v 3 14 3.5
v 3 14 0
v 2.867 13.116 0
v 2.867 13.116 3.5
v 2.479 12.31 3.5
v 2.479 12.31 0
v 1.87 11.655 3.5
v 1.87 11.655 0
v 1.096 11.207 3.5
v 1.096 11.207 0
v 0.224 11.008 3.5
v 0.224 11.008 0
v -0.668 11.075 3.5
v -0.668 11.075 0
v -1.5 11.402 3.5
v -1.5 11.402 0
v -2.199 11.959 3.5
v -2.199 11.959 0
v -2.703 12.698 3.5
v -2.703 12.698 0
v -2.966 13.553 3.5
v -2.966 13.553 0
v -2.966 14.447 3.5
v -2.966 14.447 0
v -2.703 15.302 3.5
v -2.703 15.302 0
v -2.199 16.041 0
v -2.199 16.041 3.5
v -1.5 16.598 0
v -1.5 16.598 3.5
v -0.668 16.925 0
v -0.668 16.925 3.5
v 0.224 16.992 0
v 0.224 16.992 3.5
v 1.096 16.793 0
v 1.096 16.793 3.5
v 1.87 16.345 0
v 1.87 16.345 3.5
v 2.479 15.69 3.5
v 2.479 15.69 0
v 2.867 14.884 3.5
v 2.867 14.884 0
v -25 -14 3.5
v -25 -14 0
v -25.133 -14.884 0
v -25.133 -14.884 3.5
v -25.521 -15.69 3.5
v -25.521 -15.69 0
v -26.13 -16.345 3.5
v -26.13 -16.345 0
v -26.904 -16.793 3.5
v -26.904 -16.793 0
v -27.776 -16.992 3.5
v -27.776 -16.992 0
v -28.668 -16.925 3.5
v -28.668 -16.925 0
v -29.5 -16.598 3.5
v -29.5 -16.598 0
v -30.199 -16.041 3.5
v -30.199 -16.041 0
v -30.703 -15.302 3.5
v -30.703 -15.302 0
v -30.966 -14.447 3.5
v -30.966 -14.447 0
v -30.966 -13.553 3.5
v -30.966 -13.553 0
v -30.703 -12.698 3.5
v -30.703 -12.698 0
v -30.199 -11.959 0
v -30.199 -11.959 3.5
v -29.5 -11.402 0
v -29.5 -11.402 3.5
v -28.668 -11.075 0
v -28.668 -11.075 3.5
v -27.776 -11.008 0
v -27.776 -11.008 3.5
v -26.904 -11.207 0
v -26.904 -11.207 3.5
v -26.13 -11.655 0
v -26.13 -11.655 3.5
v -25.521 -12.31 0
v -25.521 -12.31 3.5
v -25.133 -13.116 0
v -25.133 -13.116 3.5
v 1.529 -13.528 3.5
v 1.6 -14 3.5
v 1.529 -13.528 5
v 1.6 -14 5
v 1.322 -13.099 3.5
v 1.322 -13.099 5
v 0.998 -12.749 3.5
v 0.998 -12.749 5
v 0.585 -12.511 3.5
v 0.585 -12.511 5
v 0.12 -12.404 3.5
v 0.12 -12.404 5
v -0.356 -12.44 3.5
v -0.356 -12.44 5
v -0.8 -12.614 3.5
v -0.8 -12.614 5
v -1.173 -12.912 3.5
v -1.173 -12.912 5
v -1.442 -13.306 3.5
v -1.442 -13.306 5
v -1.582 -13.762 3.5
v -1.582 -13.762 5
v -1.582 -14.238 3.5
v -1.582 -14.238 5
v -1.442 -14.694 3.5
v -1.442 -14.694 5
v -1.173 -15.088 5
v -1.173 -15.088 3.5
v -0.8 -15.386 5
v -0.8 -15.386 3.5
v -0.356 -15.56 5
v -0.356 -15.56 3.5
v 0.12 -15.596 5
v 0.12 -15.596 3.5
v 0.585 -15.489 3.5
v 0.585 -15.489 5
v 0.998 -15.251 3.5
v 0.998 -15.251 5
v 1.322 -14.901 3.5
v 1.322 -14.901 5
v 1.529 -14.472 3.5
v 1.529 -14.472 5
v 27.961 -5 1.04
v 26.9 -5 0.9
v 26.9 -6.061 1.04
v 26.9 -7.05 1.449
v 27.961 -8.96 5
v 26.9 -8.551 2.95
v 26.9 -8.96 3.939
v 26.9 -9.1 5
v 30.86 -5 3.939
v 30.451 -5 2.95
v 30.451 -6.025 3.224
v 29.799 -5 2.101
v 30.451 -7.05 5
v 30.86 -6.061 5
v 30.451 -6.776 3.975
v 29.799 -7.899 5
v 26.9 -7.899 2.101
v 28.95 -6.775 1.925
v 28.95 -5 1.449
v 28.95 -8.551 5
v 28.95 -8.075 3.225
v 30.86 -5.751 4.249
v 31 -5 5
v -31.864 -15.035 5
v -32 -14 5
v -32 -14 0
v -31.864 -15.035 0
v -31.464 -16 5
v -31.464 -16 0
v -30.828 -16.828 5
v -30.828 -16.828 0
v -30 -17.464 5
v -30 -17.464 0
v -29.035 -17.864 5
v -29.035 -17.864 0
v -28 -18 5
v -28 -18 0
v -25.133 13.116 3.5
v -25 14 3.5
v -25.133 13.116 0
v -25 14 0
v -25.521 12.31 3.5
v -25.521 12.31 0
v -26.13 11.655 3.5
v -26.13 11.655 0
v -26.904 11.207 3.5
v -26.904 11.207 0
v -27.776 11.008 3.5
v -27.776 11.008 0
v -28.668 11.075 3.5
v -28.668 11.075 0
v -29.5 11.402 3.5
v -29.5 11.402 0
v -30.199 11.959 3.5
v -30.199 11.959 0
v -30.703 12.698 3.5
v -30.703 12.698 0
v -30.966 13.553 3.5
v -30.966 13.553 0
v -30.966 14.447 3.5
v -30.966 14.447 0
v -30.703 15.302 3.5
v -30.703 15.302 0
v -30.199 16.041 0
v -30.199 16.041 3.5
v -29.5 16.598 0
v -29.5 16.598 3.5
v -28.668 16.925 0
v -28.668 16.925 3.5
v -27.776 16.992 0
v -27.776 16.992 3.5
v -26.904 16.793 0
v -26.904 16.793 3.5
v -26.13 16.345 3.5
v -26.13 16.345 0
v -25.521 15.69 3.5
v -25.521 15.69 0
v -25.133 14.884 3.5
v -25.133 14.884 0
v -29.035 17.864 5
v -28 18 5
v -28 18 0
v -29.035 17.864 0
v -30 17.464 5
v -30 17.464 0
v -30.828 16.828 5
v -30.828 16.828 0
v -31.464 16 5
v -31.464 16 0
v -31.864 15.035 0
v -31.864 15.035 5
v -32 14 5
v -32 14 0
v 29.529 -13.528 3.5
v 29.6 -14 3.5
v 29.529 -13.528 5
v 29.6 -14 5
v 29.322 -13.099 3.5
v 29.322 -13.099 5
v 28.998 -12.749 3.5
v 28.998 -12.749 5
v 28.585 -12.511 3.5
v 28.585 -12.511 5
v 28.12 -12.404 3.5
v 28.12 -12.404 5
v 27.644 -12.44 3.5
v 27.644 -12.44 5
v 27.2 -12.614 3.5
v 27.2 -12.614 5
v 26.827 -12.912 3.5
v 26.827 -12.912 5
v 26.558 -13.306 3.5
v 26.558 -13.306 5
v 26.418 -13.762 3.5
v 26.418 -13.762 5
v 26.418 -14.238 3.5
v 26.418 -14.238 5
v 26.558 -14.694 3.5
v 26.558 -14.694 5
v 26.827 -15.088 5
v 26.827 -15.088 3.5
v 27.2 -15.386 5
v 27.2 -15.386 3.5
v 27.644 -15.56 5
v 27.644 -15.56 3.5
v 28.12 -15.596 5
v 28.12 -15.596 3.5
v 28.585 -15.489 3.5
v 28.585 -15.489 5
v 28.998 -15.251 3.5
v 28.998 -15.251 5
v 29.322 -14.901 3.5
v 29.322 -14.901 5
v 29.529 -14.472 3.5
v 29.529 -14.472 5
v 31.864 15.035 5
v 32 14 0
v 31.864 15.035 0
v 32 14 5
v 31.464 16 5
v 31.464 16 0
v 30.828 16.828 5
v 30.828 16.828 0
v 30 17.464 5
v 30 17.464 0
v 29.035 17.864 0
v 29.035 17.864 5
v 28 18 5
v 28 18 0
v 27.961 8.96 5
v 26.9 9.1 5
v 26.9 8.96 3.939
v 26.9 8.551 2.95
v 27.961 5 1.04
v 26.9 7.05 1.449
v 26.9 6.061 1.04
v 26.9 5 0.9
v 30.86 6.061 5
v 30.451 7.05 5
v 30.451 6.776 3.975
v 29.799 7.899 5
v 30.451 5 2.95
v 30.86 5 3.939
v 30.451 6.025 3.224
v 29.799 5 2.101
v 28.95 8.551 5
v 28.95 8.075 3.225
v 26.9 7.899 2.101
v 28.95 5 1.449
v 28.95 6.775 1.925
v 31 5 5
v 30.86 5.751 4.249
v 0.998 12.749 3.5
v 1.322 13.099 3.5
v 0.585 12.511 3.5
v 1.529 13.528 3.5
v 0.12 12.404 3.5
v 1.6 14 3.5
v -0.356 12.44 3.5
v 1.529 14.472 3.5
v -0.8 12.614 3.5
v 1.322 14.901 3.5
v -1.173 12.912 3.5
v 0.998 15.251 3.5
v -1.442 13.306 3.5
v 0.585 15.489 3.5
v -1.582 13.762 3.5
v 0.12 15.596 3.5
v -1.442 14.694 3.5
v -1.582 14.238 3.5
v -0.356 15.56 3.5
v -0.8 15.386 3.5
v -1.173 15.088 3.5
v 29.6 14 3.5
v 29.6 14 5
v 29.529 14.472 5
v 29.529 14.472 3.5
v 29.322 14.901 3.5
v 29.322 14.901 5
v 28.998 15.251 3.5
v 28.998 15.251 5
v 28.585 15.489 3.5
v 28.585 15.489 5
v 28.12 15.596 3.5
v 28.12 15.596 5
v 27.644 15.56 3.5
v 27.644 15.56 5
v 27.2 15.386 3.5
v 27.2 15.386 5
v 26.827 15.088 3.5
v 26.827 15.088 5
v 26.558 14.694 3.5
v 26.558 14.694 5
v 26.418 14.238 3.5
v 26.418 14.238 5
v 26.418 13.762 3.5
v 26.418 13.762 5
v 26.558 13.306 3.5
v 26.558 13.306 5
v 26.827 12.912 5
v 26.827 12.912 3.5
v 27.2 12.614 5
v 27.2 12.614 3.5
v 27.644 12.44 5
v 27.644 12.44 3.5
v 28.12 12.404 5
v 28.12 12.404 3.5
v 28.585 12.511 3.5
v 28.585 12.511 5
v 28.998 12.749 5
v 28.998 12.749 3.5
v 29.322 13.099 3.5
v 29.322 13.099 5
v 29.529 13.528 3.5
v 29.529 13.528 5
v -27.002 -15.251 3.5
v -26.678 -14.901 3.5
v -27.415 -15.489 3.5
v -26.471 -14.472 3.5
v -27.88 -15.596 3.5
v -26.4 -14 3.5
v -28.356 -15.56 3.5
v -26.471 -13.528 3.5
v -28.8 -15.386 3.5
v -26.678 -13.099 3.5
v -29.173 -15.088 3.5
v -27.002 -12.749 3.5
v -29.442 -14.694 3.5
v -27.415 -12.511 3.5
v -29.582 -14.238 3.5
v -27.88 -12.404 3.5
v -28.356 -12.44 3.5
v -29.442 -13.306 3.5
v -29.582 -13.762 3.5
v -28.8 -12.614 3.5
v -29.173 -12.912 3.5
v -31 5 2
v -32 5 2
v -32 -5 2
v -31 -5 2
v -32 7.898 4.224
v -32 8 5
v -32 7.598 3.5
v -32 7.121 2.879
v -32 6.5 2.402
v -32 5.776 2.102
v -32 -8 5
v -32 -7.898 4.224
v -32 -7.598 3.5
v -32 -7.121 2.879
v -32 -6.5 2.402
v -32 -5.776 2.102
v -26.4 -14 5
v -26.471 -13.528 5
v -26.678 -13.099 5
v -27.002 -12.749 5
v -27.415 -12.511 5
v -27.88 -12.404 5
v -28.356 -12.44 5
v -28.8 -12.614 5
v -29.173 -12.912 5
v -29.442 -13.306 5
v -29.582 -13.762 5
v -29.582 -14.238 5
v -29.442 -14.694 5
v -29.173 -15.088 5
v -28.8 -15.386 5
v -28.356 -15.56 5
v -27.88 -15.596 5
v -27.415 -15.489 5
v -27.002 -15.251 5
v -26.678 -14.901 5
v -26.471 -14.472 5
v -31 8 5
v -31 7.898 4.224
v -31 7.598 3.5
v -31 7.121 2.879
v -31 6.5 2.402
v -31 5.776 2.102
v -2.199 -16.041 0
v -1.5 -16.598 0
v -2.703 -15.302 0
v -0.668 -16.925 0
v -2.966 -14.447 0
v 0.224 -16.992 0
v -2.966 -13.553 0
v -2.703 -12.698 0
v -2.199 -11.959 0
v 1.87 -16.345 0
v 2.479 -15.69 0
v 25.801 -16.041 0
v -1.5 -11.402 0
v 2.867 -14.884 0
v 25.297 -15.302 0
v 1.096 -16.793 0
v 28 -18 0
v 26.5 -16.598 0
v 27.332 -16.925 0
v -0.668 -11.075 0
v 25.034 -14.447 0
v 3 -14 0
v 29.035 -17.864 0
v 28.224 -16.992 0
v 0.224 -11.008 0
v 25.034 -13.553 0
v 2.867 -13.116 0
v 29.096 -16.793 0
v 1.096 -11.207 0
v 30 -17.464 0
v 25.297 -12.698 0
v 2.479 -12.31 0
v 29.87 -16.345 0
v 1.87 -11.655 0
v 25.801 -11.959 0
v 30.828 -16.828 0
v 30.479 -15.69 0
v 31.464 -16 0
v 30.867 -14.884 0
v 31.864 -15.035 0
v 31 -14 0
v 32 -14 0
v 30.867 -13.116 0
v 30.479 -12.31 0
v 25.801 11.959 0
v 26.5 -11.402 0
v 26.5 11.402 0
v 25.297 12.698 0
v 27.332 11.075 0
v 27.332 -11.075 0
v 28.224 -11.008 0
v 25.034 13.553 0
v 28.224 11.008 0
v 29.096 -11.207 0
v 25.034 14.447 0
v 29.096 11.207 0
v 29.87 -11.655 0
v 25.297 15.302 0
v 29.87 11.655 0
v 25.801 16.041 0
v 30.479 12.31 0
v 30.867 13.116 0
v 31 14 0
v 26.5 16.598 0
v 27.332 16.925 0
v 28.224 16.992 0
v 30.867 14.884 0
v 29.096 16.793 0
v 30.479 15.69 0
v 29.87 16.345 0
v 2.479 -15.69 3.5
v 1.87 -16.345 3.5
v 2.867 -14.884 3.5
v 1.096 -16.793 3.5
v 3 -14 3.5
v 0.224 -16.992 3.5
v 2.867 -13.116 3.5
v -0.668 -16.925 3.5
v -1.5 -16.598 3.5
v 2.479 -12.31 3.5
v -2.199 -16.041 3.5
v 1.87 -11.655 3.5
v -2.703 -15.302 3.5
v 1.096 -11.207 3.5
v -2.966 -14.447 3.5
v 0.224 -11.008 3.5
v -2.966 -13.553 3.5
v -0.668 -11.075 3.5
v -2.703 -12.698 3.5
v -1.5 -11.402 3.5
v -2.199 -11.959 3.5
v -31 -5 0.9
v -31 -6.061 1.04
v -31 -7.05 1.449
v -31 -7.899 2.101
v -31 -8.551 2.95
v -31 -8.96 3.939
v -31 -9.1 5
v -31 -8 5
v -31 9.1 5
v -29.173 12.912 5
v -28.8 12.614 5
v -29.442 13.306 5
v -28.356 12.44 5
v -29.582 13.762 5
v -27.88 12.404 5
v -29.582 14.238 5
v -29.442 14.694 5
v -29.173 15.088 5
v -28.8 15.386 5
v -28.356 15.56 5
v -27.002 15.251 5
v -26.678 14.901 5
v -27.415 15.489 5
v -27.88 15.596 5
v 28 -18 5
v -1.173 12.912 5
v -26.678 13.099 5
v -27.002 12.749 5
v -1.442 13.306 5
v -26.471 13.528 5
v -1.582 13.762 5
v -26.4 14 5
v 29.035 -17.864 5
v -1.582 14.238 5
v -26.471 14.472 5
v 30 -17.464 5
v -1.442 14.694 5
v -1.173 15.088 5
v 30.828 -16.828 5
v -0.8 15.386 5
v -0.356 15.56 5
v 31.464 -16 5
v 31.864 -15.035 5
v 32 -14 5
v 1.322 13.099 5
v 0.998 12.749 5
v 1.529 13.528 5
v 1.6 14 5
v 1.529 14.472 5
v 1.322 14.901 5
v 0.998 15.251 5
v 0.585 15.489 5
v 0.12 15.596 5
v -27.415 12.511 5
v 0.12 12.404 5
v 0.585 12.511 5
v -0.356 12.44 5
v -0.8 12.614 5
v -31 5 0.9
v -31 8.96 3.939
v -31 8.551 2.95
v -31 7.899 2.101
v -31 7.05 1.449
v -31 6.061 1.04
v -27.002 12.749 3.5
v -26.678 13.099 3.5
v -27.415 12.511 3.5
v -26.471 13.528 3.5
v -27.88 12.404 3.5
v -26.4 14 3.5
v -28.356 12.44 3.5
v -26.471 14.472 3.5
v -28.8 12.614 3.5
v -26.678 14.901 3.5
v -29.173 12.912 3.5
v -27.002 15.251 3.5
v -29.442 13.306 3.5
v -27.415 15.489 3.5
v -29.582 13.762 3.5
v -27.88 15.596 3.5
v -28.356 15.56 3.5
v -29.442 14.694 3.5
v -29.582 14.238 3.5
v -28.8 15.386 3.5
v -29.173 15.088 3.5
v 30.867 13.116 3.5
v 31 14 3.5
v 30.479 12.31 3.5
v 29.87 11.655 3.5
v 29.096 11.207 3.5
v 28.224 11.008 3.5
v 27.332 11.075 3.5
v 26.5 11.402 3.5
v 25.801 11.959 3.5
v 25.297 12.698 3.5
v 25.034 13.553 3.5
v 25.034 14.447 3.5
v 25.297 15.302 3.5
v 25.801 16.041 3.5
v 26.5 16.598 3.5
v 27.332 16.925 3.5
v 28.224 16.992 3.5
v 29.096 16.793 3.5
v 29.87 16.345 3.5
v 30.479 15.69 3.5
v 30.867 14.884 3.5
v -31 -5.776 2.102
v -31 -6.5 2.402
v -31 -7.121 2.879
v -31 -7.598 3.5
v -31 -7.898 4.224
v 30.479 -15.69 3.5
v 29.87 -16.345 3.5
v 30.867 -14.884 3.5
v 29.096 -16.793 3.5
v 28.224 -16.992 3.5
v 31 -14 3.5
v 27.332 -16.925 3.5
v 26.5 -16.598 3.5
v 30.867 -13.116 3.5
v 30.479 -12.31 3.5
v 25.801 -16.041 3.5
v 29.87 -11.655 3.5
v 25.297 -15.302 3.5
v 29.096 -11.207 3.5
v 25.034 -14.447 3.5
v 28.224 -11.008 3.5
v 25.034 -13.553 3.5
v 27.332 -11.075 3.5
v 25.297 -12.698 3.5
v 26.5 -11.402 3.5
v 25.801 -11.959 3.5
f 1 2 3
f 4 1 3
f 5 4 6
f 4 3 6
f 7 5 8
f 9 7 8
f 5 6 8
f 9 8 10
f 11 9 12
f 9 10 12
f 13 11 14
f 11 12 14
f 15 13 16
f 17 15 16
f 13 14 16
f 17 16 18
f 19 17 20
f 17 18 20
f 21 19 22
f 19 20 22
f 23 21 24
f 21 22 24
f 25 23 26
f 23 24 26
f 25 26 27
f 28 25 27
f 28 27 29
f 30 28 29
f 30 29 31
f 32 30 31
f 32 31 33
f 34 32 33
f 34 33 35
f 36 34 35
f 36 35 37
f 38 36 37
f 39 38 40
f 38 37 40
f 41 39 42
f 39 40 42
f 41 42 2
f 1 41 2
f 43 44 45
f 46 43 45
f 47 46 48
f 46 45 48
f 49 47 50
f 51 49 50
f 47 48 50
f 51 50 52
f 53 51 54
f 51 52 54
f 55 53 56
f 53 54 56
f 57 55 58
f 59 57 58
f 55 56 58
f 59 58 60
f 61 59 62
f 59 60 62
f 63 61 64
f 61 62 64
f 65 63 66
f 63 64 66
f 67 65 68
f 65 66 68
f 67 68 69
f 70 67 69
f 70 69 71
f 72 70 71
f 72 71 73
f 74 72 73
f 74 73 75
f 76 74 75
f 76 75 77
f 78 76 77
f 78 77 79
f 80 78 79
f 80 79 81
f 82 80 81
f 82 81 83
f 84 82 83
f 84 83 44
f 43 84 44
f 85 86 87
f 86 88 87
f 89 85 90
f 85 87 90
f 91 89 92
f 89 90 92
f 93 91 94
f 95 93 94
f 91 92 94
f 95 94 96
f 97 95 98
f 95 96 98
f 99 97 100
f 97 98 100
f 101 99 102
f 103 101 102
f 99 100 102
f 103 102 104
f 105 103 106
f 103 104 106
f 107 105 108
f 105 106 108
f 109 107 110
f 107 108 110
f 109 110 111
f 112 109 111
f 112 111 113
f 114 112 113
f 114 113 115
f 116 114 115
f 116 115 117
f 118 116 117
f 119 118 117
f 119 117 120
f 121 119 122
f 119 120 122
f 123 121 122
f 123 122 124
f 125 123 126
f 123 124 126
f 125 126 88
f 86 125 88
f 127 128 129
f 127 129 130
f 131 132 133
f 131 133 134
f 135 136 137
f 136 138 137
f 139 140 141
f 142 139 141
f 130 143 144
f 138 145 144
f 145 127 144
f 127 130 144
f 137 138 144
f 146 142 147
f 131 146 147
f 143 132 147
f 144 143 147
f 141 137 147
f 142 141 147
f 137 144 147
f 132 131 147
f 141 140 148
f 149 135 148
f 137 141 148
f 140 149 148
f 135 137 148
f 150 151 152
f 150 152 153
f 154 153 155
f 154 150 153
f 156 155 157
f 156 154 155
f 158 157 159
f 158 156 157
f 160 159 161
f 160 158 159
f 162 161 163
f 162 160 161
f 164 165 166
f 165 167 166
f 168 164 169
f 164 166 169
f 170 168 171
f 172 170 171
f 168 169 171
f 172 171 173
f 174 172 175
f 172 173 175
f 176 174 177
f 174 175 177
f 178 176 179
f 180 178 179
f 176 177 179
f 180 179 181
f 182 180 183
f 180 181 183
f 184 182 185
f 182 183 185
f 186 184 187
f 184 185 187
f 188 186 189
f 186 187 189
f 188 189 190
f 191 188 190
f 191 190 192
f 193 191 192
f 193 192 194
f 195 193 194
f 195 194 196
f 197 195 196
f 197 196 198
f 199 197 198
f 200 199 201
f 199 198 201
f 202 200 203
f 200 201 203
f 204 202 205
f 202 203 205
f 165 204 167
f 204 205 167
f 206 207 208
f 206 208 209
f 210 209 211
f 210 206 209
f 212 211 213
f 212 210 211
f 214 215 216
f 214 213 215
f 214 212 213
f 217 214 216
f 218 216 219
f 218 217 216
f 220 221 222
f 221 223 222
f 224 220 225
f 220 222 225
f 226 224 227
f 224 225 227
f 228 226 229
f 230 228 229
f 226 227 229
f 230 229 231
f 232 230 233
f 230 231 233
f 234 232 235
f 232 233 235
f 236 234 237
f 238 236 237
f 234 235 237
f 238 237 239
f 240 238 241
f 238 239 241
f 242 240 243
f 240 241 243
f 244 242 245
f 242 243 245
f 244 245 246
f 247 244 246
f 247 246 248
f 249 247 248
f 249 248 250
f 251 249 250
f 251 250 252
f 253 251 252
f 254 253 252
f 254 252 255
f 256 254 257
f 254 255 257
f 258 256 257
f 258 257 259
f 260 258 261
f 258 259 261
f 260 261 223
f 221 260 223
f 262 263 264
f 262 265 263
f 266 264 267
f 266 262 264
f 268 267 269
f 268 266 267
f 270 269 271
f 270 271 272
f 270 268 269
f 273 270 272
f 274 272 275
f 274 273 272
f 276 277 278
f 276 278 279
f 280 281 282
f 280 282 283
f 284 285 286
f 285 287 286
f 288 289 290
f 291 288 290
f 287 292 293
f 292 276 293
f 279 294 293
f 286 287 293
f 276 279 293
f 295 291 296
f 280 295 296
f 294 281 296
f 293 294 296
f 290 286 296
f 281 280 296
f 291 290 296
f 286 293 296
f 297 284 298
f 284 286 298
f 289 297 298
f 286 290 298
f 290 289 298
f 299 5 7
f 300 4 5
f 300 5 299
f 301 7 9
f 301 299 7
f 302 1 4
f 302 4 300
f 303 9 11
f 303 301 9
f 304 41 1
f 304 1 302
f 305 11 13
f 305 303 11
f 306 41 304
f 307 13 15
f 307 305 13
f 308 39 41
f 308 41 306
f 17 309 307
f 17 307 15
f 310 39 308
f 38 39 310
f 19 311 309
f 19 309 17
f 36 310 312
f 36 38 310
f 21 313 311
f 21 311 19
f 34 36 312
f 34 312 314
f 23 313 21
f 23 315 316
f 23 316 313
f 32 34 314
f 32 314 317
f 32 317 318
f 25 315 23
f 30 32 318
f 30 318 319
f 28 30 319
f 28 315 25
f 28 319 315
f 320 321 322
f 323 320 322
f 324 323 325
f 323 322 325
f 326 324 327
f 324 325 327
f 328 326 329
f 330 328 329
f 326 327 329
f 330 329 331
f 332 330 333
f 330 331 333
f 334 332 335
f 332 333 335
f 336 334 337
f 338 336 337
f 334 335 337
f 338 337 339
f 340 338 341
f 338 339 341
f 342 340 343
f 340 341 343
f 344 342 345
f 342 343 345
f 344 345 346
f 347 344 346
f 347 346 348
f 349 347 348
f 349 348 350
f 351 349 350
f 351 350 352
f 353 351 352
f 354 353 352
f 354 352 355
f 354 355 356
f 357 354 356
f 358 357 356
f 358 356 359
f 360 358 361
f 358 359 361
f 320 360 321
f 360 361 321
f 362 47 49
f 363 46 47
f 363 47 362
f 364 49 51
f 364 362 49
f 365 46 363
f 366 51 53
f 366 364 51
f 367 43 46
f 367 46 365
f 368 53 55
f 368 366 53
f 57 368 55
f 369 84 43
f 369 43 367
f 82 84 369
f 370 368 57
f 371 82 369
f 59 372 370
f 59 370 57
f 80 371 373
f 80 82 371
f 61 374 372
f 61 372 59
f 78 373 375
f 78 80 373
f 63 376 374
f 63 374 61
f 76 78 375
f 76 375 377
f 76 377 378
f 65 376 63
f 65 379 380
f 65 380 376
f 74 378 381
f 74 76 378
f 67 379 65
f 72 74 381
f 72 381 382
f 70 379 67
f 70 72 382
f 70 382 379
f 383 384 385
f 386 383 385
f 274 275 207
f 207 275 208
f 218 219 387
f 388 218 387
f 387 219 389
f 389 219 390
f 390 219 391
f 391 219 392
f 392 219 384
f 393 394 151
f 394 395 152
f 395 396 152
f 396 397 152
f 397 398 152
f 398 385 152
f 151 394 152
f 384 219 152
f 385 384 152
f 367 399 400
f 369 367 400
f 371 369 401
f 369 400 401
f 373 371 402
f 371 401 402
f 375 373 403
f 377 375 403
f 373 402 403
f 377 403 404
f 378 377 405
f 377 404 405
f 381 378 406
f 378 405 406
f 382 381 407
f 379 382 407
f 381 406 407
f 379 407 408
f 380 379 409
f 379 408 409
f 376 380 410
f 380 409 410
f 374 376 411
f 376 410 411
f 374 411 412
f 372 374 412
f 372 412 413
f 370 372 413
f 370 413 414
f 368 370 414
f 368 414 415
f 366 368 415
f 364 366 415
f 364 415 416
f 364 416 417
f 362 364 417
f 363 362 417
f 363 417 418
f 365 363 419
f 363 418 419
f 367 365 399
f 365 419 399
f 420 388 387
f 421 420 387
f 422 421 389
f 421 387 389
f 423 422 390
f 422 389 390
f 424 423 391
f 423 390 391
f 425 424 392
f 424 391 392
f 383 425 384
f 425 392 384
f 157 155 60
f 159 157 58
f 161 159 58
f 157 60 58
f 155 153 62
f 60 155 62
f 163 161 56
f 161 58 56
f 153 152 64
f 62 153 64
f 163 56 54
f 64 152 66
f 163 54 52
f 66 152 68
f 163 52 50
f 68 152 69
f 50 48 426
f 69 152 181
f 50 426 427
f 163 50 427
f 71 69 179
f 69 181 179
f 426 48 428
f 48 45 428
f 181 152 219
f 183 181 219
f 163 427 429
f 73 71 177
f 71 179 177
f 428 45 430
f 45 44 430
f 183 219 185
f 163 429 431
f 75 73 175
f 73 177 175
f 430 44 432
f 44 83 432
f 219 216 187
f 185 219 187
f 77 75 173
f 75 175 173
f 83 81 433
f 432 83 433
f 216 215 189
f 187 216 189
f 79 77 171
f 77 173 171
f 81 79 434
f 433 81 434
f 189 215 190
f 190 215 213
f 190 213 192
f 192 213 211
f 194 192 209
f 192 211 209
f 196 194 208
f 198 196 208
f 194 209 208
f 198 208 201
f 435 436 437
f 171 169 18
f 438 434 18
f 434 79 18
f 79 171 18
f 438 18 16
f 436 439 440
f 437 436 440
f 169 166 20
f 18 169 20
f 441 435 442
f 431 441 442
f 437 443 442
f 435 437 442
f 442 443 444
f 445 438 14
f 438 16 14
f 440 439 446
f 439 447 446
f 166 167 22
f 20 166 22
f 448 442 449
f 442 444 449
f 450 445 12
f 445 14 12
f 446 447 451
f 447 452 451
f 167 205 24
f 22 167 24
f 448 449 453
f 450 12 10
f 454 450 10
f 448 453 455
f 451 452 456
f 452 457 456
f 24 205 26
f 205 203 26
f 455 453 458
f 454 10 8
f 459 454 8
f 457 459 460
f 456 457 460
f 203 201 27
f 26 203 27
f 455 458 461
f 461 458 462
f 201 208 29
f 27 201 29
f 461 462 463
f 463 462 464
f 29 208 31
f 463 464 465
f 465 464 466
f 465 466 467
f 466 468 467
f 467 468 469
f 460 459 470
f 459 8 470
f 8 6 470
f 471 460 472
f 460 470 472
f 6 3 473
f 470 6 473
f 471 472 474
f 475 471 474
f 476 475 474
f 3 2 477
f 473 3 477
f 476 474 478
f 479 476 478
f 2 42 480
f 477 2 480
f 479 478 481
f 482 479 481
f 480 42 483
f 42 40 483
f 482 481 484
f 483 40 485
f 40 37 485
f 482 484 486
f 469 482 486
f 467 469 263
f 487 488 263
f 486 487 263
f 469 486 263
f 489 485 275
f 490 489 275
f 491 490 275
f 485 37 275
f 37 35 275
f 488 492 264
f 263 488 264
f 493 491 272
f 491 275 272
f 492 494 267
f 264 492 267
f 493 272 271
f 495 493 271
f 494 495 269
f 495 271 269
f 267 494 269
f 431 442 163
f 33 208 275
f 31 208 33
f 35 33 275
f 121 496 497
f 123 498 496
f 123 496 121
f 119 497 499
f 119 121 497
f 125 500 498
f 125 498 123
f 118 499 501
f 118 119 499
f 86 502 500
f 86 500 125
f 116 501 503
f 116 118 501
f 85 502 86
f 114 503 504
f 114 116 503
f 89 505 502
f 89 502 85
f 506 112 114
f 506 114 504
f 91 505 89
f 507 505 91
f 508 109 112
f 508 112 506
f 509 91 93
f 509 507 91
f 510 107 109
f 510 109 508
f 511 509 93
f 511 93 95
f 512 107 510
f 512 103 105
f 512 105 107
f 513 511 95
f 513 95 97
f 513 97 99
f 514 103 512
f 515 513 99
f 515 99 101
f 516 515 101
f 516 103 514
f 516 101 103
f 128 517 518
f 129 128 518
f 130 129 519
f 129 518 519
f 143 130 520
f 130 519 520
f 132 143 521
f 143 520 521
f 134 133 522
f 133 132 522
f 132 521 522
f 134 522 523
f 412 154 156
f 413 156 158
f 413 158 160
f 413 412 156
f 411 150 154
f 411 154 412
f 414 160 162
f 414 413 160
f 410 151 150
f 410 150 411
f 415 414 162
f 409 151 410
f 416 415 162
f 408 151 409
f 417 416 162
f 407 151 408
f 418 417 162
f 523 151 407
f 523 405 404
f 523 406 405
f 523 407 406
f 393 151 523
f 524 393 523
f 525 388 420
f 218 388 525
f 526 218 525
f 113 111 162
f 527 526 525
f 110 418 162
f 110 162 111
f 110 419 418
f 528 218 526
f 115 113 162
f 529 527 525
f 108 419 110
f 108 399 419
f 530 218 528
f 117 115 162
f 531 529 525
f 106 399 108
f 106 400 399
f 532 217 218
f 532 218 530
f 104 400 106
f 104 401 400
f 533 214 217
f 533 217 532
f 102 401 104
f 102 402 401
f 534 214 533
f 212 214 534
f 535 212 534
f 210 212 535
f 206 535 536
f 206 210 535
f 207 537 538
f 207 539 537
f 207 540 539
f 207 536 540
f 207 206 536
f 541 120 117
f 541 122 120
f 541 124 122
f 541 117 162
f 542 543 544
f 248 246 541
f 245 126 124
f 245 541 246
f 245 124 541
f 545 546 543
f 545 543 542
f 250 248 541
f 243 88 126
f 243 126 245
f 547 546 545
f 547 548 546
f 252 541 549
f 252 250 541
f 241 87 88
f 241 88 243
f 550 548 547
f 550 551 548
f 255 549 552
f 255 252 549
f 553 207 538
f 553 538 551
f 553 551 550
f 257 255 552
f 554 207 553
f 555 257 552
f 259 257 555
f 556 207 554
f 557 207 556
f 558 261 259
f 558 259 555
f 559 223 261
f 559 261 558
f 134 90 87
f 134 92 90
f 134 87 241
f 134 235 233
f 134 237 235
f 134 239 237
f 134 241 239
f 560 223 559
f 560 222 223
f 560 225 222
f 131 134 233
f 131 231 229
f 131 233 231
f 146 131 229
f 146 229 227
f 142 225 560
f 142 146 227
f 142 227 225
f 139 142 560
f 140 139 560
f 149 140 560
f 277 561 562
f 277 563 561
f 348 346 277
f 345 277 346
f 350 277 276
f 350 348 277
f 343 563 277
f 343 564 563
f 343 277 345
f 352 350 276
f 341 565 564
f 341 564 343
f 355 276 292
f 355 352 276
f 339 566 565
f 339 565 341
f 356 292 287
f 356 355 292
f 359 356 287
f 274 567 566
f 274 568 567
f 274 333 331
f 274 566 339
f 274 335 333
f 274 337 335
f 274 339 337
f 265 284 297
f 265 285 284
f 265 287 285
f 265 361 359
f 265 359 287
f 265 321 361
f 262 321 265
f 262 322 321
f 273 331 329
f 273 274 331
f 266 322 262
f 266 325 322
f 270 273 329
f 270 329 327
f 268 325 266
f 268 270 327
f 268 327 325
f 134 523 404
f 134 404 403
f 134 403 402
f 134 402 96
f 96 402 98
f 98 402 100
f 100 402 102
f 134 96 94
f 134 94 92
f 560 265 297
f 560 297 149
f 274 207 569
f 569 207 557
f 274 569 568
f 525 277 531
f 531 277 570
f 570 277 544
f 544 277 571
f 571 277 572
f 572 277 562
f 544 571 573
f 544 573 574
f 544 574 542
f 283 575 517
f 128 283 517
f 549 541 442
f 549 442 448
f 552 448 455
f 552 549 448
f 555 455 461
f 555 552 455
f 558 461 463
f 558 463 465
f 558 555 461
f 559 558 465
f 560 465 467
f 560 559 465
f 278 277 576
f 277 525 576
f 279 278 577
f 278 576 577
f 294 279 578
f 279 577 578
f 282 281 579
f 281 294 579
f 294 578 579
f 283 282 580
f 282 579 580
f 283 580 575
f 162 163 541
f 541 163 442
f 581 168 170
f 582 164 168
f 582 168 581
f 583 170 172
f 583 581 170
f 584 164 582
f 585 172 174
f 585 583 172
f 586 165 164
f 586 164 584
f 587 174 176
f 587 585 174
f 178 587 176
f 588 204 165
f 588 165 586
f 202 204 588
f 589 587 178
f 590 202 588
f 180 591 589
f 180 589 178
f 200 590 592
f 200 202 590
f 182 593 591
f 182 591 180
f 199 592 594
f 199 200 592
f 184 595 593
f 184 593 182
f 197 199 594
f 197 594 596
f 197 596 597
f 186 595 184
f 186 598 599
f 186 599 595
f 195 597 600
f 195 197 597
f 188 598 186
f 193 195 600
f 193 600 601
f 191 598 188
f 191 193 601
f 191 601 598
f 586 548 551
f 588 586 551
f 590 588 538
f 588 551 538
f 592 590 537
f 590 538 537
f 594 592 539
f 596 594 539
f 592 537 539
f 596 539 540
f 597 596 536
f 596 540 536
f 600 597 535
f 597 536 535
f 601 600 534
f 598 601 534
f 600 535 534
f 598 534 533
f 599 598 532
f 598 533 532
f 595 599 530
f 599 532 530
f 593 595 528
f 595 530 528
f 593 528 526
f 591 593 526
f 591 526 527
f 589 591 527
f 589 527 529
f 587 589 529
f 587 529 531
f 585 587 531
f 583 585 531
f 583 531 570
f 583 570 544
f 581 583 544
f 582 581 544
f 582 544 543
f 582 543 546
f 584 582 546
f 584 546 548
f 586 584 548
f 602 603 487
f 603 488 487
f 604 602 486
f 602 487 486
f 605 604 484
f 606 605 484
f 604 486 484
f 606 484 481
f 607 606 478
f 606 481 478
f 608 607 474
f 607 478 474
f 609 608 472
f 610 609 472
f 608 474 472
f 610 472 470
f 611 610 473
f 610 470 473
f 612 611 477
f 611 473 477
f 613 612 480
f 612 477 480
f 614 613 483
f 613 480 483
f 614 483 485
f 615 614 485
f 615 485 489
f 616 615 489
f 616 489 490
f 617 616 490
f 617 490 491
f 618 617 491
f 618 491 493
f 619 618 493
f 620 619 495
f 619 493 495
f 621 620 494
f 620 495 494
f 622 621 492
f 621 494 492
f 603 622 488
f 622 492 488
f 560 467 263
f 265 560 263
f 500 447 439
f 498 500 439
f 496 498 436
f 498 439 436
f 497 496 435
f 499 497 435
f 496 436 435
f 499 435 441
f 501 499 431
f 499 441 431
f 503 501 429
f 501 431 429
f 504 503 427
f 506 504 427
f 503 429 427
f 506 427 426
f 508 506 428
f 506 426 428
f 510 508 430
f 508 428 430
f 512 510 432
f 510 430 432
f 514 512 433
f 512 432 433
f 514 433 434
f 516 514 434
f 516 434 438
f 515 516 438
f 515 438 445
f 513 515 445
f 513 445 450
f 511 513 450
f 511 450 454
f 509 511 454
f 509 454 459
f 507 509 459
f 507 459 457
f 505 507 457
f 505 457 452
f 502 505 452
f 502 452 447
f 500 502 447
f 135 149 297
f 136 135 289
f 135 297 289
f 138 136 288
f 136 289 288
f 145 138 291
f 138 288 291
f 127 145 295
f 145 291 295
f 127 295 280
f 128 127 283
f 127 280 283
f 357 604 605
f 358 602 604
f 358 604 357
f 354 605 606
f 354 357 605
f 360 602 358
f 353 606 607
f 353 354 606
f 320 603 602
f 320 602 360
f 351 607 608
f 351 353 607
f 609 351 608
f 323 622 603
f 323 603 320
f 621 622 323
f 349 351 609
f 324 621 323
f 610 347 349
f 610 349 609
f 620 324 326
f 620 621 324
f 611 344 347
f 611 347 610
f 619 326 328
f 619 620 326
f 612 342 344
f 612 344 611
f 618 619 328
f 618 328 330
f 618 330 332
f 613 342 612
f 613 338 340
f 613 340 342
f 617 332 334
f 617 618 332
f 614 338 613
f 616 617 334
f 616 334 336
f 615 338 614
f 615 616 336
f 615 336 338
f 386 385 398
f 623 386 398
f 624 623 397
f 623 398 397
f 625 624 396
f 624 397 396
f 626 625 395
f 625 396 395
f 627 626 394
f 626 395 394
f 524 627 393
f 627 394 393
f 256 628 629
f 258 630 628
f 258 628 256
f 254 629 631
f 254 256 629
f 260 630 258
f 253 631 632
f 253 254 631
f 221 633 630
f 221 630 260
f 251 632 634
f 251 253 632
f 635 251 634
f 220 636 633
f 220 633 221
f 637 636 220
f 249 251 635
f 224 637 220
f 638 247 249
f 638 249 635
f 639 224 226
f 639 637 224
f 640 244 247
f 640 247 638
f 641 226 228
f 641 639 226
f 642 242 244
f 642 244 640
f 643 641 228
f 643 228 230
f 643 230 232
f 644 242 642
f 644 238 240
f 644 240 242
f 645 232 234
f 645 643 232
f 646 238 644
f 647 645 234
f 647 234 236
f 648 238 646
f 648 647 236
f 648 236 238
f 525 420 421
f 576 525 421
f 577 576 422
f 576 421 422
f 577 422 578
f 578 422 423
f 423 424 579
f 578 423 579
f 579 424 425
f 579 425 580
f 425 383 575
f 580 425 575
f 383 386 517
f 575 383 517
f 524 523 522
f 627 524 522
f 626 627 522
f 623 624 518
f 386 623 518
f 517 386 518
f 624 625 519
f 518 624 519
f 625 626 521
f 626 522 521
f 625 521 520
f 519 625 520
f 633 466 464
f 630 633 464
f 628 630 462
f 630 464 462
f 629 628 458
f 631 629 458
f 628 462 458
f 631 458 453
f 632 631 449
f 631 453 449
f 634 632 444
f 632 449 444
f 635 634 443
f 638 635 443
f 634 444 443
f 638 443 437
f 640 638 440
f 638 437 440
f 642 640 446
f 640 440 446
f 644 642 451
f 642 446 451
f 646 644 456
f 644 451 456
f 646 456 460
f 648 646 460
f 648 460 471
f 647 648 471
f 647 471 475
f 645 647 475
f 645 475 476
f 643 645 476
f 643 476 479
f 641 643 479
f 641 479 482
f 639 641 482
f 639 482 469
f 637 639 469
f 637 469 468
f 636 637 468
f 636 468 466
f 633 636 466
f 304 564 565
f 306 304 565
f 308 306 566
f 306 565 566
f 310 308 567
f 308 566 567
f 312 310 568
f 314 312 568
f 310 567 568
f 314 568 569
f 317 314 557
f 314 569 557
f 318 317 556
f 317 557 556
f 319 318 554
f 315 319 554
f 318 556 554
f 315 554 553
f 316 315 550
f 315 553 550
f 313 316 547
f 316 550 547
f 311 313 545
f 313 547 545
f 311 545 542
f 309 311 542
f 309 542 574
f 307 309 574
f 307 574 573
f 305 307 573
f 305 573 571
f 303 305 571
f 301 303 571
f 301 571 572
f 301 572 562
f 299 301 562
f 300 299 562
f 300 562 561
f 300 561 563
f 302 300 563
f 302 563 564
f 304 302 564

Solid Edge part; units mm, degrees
sketch "Sketch1" plane through (0, 0, 0) normal (0, 0, 1) x (1, 0, 0)
  line L0 (32, -18) -> (32, 18)
  line L1 (32, 18) -> (-32, 18)
  line L2 (-32, 18) -> (-32, -18)
  line L3 (-32, -18) -> (32, -18)
extrude "Protrusion1" add sketch "Sketch1" along normal blind 5
sketch "Sketch2" plane through (-32, 0, 2.5) normal (-1, 0, 0) x (0, -1, 0)
  line L0 (-5, -0.5) -> (5, -0.5)
  line L1 (-8, 2.5) -> (8, 2.5)
  arc A0 (8, 2.5) -> (5, -0.5) centre (5, 2.5) cw
  arc A1 (-5, -0.5) -> (-8, 2.5) centre (-5, 2.5) cw
extrude "VaciadoExtruido_2" cut sketch "Sketch2" against normal blind 1
sketch "Sketch3" plane through (-31, 0, 2.5) normal (-1, 0, 0) x (0, -1, 0)
  line L0 (-5, -1.6) -> (5, -1.6)
  line L1 (-9.1, 2.5) -> (9.1, 2.5)
  arc A0 (9.1, 2.5) -> (5, -1.6) centre (5, 2.5) cw
  arc A1 (-5, -1.6) -> (-9.1, 2.5) centre (-5, 2.5) cw
extrude "VaciadoExtruido_3" cut sketch "Sketch3" against normal blind 62
fillet "Redondeo_3" radius 4.1 3 edges at (31, 7.8991, 2.1009) (31, -7.8991, 2.1009) (31, 0, 0.9)
sketch "Sketch4" plane through (0, 0, 5) normal (0, 0, 1) x (1, 0, 0)
  circle A0 centre (-28, 14) radius 1.6
extrude "Cutout1" cut sketch "Sketch4" against normal through all
sketch "Sketch5" plane through (0, 0, 0) normal (0, 0, -1) x (1, 0, 0)
  circle A0 centre (-28, -14) radius 3
extrude "VaciadoExtruido_5" cut sketch "Sketch5" against normal blind 3.5
pattern_linear "Pattern1" count 3 spacing 28 along (1, 0, 0) count 2 spacing 28 along (0, -1, 0) of "VaciadoExtruido_5", "Cutout1"
fillet "Redondeo_4" radius 4 4 edges at (-32, 18, 2.5) (-32, -18, 2.5) (32, 18, 2.5) (32, -18, 2.5)
